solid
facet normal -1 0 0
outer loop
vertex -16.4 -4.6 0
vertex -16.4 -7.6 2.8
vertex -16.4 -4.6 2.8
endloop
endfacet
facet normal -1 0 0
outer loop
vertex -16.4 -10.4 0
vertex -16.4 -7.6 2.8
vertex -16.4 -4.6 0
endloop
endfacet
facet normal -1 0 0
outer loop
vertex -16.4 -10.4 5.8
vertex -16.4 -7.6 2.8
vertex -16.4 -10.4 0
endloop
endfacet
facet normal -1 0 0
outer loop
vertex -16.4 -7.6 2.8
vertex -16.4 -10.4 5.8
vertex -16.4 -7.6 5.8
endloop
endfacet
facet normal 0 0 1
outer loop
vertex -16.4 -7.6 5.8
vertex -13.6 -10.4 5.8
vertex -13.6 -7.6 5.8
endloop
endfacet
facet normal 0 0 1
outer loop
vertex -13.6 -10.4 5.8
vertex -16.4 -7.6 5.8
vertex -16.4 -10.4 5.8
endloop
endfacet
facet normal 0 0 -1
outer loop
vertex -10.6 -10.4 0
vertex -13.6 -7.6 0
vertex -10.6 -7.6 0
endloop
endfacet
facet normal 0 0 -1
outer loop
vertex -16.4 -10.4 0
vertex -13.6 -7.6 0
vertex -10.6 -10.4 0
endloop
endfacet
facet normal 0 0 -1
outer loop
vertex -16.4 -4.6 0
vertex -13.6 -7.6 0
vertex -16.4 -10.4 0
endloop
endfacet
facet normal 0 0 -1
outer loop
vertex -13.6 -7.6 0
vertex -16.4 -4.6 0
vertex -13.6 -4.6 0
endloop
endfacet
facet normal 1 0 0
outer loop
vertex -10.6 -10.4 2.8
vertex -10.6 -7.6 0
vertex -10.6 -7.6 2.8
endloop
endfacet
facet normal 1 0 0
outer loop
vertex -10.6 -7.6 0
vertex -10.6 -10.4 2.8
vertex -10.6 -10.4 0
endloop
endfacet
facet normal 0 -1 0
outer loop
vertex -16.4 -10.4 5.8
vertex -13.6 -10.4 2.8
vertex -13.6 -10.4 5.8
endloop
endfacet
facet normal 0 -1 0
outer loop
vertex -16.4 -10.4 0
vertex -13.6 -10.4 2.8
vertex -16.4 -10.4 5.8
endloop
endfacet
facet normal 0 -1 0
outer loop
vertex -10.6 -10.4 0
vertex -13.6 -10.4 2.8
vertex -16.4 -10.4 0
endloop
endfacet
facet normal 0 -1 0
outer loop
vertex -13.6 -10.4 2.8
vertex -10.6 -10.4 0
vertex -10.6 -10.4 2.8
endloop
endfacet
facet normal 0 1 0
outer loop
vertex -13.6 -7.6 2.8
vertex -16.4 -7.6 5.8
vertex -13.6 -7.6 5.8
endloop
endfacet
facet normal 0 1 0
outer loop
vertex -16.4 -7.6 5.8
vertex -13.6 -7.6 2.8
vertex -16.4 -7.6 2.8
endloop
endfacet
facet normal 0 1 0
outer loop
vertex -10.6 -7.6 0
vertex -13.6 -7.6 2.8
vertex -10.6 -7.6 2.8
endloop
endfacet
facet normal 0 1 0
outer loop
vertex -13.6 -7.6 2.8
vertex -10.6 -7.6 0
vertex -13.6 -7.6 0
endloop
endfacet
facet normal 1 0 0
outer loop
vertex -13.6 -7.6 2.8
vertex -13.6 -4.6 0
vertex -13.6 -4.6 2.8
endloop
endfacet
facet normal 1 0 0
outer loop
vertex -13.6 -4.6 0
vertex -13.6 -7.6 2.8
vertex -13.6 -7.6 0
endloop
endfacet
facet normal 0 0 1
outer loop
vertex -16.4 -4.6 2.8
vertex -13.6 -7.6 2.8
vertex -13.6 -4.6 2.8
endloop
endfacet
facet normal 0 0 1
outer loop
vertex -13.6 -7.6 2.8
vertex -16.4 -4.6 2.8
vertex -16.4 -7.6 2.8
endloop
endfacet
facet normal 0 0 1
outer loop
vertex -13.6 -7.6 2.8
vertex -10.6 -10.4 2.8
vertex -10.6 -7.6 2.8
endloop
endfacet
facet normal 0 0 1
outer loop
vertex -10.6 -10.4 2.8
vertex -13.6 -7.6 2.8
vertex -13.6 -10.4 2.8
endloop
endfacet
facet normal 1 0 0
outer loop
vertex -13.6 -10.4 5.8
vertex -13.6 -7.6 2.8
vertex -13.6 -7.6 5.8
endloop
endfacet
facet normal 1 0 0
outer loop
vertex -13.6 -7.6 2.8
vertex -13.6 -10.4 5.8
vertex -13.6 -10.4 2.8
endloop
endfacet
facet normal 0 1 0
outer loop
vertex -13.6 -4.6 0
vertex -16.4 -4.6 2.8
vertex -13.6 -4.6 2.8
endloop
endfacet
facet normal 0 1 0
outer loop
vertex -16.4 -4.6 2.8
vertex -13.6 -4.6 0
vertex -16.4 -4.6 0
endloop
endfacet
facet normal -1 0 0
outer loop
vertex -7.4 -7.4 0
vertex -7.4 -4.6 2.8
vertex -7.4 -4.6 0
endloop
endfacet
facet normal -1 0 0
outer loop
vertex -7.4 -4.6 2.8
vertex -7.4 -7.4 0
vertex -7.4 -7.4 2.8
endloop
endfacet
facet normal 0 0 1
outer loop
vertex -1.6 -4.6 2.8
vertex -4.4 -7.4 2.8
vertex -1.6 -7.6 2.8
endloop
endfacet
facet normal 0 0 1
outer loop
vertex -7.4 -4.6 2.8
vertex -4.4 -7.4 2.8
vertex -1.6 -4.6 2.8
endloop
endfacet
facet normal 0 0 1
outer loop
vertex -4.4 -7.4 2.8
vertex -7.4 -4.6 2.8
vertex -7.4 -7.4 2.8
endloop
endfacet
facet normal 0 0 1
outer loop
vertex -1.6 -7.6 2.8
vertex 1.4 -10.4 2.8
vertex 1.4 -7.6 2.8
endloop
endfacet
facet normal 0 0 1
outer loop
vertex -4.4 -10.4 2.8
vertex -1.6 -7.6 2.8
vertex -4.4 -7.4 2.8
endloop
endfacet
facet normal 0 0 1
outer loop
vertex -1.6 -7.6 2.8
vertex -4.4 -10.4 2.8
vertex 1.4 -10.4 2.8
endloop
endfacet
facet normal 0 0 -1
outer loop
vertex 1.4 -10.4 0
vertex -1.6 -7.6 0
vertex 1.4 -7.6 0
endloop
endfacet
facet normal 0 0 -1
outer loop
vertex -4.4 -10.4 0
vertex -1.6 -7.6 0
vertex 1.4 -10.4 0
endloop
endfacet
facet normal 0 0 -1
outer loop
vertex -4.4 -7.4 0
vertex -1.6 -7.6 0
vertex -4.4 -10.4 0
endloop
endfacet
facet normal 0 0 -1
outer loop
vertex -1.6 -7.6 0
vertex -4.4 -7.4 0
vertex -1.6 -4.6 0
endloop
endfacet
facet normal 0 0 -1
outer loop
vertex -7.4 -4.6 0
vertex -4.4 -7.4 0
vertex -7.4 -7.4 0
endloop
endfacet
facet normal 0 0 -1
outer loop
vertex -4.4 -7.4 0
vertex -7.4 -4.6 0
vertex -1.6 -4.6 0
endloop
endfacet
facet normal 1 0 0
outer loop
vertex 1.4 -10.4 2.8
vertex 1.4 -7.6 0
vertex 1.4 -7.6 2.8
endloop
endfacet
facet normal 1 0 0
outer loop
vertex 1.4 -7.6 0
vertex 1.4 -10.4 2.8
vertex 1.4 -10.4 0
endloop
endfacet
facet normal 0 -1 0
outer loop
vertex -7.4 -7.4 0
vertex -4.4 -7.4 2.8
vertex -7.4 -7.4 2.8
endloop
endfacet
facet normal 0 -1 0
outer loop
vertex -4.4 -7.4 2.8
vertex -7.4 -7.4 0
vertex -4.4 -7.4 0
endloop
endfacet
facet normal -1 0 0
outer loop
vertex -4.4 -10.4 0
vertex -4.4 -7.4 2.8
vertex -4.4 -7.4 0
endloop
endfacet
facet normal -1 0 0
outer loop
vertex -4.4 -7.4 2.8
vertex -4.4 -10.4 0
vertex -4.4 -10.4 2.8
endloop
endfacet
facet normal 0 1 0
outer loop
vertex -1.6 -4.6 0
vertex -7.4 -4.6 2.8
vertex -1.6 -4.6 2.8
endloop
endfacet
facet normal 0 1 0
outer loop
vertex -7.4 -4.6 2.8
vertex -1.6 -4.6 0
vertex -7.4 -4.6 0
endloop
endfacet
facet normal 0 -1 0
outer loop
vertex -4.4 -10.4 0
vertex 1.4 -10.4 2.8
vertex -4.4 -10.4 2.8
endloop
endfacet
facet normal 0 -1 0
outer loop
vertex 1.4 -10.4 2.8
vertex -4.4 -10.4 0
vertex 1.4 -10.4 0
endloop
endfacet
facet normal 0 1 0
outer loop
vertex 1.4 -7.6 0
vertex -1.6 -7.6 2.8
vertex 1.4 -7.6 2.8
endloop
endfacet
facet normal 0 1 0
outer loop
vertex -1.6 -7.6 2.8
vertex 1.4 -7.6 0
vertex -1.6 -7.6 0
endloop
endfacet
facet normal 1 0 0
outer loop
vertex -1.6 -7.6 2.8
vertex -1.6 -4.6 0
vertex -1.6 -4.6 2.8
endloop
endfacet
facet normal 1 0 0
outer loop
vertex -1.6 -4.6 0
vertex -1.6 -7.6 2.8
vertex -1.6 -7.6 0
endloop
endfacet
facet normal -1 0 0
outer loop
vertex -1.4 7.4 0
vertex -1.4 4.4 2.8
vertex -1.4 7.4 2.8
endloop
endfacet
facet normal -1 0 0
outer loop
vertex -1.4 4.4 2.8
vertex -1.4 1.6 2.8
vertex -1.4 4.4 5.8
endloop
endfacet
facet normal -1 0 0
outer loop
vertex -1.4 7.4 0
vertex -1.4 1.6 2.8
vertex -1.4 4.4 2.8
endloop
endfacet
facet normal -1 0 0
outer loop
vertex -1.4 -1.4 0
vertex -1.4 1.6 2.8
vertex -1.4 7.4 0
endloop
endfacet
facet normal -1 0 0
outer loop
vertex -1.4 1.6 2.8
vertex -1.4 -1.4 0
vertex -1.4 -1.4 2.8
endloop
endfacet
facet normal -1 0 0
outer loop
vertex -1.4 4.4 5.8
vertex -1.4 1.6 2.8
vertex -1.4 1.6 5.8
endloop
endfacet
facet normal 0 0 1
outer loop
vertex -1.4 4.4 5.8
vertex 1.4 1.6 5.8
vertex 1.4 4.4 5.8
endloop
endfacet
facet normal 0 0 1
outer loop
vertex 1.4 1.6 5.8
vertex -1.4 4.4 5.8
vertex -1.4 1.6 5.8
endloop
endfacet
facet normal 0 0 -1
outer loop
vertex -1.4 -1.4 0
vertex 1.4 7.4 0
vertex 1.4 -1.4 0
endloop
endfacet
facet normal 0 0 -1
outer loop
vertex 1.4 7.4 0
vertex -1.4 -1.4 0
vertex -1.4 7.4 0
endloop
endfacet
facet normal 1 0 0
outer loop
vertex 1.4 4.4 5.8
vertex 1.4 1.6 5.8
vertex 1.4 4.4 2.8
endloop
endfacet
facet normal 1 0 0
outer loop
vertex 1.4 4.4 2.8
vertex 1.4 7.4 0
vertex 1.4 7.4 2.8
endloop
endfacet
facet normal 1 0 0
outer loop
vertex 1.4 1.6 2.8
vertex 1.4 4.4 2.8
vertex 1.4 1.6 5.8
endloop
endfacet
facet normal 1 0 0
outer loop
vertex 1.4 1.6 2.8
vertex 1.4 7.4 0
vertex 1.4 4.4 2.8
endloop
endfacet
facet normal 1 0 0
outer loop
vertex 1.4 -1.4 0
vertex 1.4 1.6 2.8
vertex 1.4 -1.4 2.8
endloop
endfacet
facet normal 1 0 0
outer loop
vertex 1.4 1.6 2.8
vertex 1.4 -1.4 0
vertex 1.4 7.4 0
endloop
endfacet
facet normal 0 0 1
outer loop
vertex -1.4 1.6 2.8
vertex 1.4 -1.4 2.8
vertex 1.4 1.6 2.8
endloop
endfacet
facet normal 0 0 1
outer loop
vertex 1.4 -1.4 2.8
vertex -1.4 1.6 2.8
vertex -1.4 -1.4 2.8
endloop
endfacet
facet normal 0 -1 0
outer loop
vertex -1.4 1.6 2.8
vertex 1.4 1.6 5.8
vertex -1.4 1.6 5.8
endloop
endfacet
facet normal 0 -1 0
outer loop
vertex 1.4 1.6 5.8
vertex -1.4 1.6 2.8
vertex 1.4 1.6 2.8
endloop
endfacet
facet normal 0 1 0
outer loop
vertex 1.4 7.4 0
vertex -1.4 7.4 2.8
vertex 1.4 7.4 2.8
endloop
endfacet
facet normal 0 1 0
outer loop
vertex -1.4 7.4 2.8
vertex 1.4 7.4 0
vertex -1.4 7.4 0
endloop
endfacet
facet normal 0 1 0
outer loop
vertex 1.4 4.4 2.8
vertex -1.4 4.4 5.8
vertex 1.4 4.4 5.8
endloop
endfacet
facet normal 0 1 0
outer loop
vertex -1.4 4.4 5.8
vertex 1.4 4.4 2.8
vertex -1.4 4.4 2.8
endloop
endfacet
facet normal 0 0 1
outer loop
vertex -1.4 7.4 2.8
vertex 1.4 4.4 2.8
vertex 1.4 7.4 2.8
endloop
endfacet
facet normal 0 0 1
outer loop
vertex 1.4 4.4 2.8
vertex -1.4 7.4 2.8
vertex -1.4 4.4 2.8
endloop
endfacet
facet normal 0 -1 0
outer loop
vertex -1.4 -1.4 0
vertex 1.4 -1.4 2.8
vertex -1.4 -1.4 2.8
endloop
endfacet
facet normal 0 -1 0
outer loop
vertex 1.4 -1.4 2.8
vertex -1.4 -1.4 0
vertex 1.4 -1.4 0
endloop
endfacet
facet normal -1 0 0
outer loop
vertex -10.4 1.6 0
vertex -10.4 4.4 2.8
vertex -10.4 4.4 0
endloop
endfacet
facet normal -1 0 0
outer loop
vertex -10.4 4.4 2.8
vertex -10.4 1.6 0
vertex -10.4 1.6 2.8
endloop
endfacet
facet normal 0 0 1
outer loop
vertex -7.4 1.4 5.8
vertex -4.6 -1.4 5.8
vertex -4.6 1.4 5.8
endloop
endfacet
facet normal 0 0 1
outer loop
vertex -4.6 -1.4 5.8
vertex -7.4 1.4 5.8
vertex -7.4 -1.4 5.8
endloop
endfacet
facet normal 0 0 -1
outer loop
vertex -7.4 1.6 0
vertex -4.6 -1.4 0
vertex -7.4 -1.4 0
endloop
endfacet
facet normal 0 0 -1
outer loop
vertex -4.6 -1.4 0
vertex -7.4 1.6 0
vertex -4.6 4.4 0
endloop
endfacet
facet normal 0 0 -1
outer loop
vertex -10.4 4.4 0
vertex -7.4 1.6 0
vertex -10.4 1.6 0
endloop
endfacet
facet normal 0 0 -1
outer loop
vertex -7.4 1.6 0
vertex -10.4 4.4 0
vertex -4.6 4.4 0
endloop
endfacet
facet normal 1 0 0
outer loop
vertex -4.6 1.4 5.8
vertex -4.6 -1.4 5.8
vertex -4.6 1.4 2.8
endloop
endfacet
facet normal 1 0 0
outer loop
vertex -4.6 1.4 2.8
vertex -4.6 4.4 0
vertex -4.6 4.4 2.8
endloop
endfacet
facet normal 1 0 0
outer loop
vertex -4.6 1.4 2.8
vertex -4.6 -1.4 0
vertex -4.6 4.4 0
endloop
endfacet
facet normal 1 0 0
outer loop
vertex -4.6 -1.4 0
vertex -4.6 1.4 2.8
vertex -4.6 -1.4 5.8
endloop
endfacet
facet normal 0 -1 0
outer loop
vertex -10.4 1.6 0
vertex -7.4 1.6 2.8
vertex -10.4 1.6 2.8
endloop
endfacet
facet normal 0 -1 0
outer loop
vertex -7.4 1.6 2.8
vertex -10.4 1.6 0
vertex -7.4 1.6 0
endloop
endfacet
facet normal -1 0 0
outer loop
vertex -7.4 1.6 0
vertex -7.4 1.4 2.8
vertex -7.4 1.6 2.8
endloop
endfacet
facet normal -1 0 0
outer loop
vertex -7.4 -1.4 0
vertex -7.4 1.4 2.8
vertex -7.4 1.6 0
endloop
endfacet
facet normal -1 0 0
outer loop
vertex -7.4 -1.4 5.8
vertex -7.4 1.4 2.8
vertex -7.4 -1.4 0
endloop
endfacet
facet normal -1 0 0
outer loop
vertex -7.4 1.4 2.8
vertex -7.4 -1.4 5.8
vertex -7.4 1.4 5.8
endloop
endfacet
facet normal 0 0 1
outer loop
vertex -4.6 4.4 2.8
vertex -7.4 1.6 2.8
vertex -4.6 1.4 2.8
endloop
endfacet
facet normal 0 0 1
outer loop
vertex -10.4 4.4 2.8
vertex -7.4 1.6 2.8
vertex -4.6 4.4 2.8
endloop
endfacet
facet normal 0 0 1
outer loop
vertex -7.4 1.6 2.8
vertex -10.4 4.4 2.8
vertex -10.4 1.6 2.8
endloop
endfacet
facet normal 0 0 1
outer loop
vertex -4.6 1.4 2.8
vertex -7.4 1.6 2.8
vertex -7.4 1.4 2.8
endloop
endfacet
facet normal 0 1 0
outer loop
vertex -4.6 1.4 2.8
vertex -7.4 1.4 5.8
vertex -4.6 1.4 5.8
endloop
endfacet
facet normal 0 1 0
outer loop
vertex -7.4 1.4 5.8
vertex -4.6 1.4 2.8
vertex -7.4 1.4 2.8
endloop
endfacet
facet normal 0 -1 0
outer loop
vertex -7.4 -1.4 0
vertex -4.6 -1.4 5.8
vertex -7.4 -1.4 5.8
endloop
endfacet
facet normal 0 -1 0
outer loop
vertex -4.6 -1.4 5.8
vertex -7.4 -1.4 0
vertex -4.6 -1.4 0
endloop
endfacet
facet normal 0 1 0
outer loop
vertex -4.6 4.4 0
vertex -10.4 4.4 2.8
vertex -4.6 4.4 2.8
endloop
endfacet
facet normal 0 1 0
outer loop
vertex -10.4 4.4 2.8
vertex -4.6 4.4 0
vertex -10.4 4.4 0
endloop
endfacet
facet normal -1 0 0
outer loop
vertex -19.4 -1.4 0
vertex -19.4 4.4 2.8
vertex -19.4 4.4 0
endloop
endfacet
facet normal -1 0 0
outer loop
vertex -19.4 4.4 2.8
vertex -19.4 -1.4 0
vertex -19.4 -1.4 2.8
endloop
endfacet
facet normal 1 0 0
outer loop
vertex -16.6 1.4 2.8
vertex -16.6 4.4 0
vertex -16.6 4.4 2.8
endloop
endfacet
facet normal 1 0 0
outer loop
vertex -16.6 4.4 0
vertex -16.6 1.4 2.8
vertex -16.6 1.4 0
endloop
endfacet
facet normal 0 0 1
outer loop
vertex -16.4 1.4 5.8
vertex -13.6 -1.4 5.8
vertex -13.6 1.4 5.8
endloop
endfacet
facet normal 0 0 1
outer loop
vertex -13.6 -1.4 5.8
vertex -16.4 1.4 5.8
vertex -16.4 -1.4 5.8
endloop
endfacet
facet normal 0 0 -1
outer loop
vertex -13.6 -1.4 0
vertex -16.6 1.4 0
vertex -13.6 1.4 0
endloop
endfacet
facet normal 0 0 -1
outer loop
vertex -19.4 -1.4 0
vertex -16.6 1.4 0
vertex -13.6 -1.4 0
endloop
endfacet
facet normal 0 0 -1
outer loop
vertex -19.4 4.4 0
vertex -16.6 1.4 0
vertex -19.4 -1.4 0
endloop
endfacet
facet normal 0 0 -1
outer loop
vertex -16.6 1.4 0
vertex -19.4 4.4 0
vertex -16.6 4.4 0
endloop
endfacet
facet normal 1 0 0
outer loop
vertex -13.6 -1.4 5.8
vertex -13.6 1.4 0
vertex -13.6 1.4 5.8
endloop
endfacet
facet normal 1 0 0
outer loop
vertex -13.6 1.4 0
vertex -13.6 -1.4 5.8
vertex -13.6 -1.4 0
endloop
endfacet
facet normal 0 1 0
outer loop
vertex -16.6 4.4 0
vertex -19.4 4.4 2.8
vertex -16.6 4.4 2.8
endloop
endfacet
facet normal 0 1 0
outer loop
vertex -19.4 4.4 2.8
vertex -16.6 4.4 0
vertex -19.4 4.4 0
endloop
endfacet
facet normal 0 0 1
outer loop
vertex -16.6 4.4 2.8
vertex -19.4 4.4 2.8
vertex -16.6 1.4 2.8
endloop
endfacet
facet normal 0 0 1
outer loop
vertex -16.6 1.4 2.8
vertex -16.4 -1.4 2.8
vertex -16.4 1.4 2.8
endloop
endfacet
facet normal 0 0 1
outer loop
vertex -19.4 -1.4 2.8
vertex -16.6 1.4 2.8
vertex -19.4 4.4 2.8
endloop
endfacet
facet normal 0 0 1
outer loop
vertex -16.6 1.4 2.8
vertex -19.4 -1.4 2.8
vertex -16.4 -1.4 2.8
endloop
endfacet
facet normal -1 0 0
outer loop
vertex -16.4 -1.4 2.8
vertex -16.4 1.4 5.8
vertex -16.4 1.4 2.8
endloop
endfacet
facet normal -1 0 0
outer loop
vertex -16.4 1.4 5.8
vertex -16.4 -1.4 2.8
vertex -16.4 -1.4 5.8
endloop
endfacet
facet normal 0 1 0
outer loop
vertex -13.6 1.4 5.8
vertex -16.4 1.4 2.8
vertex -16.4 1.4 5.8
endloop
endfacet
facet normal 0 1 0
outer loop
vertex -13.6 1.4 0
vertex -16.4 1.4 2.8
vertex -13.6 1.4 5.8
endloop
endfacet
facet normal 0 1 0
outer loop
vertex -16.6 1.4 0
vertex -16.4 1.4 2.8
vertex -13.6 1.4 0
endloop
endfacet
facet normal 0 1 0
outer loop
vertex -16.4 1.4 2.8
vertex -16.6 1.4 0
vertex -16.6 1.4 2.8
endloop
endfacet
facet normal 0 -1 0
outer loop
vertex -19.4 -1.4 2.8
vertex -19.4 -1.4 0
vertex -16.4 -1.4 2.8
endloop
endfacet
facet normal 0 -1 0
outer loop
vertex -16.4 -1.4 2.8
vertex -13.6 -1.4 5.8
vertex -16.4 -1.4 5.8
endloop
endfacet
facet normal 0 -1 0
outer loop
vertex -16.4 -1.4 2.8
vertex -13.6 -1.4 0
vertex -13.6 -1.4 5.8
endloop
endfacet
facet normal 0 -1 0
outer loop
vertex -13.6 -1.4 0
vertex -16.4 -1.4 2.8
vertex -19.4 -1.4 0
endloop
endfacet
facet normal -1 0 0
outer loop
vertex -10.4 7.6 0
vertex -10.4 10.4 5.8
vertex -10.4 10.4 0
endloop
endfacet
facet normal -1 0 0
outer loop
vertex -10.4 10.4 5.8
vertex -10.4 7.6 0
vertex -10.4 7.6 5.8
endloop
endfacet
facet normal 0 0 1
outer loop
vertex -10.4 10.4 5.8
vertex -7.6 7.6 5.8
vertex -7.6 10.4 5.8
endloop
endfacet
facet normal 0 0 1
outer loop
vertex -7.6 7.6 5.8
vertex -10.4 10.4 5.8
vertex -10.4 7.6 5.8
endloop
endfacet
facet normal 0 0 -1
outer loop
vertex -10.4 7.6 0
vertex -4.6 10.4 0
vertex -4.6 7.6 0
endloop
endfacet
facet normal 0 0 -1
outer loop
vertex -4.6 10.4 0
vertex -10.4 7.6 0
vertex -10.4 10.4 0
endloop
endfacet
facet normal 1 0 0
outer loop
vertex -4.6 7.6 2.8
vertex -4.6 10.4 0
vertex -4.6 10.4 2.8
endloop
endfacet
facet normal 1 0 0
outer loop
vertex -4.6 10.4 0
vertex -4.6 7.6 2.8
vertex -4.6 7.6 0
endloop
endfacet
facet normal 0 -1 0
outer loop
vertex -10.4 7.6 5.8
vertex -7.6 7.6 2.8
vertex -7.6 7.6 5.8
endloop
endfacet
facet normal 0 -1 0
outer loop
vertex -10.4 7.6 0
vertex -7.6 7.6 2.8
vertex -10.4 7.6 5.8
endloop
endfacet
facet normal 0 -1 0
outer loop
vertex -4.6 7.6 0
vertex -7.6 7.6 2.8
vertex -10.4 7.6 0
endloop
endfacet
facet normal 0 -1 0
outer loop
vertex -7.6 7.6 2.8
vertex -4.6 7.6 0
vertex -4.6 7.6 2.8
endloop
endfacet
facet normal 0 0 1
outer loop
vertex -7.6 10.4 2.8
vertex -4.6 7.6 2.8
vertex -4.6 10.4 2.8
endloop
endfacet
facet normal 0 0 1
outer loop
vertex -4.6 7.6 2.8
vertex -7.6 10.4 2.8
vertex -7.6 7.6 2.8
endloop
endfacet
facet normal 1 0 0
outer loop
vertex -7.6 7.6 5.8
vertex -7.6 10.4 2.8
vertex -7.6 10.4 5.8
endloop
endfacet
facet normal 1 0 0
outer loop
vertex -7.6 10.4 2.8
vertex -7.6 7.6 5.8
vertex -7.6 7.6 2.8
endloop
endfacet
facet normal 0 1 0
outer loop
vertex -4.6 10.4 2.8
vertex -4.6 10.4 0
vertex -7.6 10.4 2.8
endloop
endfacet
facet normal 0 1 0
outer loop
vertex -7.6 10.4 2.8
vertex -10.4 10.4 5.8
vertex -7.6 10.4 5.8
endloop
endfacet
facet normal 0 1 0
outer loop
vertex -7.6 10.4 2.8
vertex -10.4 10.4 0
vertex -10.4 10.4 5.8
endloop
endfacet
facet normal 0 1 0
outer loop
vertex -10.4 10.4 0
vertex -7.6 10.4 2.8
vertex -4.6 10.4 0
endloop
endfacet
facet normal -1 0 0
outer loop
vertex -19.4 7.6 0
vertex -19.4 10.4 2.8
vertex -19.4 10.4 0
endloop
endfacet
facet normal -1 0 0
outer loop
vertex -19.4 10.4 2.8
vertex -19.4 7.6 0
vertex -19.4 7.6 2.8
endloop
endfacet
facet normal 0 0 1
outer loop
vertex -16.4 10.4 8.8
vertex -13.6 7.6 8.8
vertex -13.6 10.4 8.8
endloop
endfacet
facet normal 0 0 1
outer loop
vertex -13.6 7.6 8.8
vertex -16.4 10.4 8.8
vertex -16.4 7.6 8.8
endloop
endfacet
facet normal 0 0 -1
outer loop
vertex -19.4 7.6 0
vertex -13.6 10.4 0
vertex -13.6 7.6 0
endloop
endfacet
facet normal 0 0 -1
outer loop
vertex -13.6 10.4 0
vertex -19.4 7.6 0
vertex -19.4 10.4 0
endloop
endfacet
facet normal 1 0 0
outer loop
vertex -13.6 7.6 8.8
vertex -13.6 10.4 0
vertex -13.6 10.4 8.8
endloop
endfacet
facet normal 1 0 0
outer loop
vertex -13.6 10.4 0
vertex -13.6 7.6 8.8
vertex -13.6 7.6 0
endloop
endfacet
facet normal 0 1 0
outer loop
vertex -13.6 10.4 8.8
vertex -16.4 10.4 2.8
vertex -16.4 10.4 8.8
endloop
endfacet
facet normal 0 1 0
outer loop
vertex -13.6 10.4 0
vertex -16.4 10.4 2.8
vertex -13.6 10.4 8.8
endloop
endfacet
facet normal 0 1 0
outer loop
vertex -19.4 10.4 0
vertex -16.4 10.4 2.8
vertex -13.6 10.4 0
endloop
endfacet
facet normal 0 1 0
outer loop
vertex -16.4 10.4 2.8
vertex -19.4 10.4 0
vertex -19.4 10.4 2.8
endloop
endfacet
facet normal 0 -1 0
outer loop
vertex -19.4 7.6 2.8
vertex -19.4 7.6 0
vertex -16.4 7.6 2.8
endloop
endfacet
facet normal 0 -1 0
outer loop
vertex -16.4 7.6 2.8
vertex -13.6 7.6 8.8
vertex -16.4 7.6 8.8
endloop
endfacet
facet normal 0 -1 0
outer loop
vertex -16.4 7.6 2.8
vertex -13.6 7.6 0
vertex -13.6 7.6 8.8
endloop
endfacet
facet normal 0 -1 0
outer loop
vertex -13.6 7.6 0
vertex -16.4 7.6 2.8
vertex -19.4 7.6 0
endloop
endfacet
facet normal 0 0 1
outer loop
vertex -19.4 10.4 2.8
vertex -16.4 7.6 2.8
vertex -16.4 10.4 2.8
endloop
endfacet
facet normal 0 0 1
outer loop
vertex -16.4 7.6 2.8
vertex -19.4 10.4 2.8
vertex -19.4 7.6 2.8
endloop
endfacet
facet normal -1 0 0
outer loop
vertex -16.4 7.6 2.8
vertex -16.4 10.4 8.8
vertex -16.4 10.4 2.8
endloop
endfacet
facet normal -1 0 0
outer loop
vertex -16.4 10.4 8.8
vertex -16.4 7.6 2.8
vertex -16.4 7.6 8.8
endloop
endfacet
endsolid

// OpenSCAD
//Scalable Soma Cube, by Alejandro Erickson
//Derived from: http://www.thingiverse.com/thing:3784 and http://www.thingiverse.com/thing:11644


//Size of Unit Cubes in mm.  Perhaps unit-shaveMM should be a multiple of your z-layer height
unit = 3; 

//Amount to shave off (inset) each piece.  Compensates for small print size.
shaveMM=.1;

part = "all";//[corner,ess,tee,rightsnake,leftsnake,angle,ell,all]


module c()
{
	cube(size=unit, center=true);
}



module bigC()
{
	cube(size=100*unit, center=true);
}

module Shave(){
  for (i = [0 : $children-1])	{
	minkowski(){
	difference(){
		bigC(); 
		minkowski(){
			difference(){ 
				bigC(); 
				child(i);
			} 
			cube(size=2*shaveMM, center=true);
		}
	}
	}	
}
}


module c1()
{
  translate([0,0,0.5*unit]) Shave() rotate(180,[0,0,1])  union()
  {
    c();
    translate([unit,0,0]) c();
    translate([unit,unit,0]) c();
    translate([unit,0,unit]) c();
  }
}



module c2()
{
translate([0,0,1.5*unit])  //angle
Shave() rotate(180,[0,0,1]) rotate(90,[0,1,0]) union()
  {
    c();
    translate([unit,0,0]) c();
    translate([unit,unit,0]) c();
  }
}


module c3()
{
translate([0,0,0.5*unit])  //ess
  Shave() rotate(180,[1,0,0]) rotate(90,[0,0,1])  union()
  {
    c();
    translate([unit,0,0]) c();
    translate([unit,unit,0]) c();
    translate([2*unit,unit,0]) c();
  }
}


module c4()
{translate([0,0,0.5*unit])
  Shave() rotate(90,[1,0,0])  union()
  {
    c();
    translate([unit,0,0]) c();
    translate([unit,unit,0]) c();
    translate([2*unit,0,0]) c();
  }
}


module c5()
{translate([0,0,0.5*unit])
  Shave() rotate(180,[0,0,1]) union()
  {
    c();
    translate([unit,0,0]) c();
    translate([unit,unit,0]) c();
    translate([unit,unit,unit]) c();
  }
}


module c6()
{translate([0,0,0.5*unit])
  Shave() union()
  {
    c();
    translate([unit,0,0]) c();
    translate([unit,unit,0]) c();
    translate([0,0,unit]) c();
  }
}


module c7()
{
translate([0,0,2.5*unit])
  Shave() rotate(90,[0,1,0])  union()
  {
    c();
    translate([unit,0,0]) c();
    translate([2*unit,unit,0]) c();
    translate([2*unit,0,0]) c();
  }
}

translate([0,0,-shaveMM])
scale(1) rotate(90,[0,0,1])
{
if(part == "all"){
translate([-2*unit,5*unit,0])  c1(); //corner
translate([-2*unit,2*unit,0]) c3(); //ess
translate([0*unit,0*unit,0]) c4(); //tee
translate([0*unit,2*unit,0]) c6(); //rightsnake
translate([1*unit,6*unit,0]) c5(); //leftsnake
translate([3*unit,3*unit,0]) c2(); //angle
translate([3*unit,5*unit,0]) c7(); //ell
}
else if(part == "corner") c1();
else if(part == "ess") c2();
else if(part == "tee") c3();
else if(part == "leftsnake") c4();
else if(part == "rightsnake") c5();
else if(part == "angle") c6();
else if(part == "ell") c7();
}
